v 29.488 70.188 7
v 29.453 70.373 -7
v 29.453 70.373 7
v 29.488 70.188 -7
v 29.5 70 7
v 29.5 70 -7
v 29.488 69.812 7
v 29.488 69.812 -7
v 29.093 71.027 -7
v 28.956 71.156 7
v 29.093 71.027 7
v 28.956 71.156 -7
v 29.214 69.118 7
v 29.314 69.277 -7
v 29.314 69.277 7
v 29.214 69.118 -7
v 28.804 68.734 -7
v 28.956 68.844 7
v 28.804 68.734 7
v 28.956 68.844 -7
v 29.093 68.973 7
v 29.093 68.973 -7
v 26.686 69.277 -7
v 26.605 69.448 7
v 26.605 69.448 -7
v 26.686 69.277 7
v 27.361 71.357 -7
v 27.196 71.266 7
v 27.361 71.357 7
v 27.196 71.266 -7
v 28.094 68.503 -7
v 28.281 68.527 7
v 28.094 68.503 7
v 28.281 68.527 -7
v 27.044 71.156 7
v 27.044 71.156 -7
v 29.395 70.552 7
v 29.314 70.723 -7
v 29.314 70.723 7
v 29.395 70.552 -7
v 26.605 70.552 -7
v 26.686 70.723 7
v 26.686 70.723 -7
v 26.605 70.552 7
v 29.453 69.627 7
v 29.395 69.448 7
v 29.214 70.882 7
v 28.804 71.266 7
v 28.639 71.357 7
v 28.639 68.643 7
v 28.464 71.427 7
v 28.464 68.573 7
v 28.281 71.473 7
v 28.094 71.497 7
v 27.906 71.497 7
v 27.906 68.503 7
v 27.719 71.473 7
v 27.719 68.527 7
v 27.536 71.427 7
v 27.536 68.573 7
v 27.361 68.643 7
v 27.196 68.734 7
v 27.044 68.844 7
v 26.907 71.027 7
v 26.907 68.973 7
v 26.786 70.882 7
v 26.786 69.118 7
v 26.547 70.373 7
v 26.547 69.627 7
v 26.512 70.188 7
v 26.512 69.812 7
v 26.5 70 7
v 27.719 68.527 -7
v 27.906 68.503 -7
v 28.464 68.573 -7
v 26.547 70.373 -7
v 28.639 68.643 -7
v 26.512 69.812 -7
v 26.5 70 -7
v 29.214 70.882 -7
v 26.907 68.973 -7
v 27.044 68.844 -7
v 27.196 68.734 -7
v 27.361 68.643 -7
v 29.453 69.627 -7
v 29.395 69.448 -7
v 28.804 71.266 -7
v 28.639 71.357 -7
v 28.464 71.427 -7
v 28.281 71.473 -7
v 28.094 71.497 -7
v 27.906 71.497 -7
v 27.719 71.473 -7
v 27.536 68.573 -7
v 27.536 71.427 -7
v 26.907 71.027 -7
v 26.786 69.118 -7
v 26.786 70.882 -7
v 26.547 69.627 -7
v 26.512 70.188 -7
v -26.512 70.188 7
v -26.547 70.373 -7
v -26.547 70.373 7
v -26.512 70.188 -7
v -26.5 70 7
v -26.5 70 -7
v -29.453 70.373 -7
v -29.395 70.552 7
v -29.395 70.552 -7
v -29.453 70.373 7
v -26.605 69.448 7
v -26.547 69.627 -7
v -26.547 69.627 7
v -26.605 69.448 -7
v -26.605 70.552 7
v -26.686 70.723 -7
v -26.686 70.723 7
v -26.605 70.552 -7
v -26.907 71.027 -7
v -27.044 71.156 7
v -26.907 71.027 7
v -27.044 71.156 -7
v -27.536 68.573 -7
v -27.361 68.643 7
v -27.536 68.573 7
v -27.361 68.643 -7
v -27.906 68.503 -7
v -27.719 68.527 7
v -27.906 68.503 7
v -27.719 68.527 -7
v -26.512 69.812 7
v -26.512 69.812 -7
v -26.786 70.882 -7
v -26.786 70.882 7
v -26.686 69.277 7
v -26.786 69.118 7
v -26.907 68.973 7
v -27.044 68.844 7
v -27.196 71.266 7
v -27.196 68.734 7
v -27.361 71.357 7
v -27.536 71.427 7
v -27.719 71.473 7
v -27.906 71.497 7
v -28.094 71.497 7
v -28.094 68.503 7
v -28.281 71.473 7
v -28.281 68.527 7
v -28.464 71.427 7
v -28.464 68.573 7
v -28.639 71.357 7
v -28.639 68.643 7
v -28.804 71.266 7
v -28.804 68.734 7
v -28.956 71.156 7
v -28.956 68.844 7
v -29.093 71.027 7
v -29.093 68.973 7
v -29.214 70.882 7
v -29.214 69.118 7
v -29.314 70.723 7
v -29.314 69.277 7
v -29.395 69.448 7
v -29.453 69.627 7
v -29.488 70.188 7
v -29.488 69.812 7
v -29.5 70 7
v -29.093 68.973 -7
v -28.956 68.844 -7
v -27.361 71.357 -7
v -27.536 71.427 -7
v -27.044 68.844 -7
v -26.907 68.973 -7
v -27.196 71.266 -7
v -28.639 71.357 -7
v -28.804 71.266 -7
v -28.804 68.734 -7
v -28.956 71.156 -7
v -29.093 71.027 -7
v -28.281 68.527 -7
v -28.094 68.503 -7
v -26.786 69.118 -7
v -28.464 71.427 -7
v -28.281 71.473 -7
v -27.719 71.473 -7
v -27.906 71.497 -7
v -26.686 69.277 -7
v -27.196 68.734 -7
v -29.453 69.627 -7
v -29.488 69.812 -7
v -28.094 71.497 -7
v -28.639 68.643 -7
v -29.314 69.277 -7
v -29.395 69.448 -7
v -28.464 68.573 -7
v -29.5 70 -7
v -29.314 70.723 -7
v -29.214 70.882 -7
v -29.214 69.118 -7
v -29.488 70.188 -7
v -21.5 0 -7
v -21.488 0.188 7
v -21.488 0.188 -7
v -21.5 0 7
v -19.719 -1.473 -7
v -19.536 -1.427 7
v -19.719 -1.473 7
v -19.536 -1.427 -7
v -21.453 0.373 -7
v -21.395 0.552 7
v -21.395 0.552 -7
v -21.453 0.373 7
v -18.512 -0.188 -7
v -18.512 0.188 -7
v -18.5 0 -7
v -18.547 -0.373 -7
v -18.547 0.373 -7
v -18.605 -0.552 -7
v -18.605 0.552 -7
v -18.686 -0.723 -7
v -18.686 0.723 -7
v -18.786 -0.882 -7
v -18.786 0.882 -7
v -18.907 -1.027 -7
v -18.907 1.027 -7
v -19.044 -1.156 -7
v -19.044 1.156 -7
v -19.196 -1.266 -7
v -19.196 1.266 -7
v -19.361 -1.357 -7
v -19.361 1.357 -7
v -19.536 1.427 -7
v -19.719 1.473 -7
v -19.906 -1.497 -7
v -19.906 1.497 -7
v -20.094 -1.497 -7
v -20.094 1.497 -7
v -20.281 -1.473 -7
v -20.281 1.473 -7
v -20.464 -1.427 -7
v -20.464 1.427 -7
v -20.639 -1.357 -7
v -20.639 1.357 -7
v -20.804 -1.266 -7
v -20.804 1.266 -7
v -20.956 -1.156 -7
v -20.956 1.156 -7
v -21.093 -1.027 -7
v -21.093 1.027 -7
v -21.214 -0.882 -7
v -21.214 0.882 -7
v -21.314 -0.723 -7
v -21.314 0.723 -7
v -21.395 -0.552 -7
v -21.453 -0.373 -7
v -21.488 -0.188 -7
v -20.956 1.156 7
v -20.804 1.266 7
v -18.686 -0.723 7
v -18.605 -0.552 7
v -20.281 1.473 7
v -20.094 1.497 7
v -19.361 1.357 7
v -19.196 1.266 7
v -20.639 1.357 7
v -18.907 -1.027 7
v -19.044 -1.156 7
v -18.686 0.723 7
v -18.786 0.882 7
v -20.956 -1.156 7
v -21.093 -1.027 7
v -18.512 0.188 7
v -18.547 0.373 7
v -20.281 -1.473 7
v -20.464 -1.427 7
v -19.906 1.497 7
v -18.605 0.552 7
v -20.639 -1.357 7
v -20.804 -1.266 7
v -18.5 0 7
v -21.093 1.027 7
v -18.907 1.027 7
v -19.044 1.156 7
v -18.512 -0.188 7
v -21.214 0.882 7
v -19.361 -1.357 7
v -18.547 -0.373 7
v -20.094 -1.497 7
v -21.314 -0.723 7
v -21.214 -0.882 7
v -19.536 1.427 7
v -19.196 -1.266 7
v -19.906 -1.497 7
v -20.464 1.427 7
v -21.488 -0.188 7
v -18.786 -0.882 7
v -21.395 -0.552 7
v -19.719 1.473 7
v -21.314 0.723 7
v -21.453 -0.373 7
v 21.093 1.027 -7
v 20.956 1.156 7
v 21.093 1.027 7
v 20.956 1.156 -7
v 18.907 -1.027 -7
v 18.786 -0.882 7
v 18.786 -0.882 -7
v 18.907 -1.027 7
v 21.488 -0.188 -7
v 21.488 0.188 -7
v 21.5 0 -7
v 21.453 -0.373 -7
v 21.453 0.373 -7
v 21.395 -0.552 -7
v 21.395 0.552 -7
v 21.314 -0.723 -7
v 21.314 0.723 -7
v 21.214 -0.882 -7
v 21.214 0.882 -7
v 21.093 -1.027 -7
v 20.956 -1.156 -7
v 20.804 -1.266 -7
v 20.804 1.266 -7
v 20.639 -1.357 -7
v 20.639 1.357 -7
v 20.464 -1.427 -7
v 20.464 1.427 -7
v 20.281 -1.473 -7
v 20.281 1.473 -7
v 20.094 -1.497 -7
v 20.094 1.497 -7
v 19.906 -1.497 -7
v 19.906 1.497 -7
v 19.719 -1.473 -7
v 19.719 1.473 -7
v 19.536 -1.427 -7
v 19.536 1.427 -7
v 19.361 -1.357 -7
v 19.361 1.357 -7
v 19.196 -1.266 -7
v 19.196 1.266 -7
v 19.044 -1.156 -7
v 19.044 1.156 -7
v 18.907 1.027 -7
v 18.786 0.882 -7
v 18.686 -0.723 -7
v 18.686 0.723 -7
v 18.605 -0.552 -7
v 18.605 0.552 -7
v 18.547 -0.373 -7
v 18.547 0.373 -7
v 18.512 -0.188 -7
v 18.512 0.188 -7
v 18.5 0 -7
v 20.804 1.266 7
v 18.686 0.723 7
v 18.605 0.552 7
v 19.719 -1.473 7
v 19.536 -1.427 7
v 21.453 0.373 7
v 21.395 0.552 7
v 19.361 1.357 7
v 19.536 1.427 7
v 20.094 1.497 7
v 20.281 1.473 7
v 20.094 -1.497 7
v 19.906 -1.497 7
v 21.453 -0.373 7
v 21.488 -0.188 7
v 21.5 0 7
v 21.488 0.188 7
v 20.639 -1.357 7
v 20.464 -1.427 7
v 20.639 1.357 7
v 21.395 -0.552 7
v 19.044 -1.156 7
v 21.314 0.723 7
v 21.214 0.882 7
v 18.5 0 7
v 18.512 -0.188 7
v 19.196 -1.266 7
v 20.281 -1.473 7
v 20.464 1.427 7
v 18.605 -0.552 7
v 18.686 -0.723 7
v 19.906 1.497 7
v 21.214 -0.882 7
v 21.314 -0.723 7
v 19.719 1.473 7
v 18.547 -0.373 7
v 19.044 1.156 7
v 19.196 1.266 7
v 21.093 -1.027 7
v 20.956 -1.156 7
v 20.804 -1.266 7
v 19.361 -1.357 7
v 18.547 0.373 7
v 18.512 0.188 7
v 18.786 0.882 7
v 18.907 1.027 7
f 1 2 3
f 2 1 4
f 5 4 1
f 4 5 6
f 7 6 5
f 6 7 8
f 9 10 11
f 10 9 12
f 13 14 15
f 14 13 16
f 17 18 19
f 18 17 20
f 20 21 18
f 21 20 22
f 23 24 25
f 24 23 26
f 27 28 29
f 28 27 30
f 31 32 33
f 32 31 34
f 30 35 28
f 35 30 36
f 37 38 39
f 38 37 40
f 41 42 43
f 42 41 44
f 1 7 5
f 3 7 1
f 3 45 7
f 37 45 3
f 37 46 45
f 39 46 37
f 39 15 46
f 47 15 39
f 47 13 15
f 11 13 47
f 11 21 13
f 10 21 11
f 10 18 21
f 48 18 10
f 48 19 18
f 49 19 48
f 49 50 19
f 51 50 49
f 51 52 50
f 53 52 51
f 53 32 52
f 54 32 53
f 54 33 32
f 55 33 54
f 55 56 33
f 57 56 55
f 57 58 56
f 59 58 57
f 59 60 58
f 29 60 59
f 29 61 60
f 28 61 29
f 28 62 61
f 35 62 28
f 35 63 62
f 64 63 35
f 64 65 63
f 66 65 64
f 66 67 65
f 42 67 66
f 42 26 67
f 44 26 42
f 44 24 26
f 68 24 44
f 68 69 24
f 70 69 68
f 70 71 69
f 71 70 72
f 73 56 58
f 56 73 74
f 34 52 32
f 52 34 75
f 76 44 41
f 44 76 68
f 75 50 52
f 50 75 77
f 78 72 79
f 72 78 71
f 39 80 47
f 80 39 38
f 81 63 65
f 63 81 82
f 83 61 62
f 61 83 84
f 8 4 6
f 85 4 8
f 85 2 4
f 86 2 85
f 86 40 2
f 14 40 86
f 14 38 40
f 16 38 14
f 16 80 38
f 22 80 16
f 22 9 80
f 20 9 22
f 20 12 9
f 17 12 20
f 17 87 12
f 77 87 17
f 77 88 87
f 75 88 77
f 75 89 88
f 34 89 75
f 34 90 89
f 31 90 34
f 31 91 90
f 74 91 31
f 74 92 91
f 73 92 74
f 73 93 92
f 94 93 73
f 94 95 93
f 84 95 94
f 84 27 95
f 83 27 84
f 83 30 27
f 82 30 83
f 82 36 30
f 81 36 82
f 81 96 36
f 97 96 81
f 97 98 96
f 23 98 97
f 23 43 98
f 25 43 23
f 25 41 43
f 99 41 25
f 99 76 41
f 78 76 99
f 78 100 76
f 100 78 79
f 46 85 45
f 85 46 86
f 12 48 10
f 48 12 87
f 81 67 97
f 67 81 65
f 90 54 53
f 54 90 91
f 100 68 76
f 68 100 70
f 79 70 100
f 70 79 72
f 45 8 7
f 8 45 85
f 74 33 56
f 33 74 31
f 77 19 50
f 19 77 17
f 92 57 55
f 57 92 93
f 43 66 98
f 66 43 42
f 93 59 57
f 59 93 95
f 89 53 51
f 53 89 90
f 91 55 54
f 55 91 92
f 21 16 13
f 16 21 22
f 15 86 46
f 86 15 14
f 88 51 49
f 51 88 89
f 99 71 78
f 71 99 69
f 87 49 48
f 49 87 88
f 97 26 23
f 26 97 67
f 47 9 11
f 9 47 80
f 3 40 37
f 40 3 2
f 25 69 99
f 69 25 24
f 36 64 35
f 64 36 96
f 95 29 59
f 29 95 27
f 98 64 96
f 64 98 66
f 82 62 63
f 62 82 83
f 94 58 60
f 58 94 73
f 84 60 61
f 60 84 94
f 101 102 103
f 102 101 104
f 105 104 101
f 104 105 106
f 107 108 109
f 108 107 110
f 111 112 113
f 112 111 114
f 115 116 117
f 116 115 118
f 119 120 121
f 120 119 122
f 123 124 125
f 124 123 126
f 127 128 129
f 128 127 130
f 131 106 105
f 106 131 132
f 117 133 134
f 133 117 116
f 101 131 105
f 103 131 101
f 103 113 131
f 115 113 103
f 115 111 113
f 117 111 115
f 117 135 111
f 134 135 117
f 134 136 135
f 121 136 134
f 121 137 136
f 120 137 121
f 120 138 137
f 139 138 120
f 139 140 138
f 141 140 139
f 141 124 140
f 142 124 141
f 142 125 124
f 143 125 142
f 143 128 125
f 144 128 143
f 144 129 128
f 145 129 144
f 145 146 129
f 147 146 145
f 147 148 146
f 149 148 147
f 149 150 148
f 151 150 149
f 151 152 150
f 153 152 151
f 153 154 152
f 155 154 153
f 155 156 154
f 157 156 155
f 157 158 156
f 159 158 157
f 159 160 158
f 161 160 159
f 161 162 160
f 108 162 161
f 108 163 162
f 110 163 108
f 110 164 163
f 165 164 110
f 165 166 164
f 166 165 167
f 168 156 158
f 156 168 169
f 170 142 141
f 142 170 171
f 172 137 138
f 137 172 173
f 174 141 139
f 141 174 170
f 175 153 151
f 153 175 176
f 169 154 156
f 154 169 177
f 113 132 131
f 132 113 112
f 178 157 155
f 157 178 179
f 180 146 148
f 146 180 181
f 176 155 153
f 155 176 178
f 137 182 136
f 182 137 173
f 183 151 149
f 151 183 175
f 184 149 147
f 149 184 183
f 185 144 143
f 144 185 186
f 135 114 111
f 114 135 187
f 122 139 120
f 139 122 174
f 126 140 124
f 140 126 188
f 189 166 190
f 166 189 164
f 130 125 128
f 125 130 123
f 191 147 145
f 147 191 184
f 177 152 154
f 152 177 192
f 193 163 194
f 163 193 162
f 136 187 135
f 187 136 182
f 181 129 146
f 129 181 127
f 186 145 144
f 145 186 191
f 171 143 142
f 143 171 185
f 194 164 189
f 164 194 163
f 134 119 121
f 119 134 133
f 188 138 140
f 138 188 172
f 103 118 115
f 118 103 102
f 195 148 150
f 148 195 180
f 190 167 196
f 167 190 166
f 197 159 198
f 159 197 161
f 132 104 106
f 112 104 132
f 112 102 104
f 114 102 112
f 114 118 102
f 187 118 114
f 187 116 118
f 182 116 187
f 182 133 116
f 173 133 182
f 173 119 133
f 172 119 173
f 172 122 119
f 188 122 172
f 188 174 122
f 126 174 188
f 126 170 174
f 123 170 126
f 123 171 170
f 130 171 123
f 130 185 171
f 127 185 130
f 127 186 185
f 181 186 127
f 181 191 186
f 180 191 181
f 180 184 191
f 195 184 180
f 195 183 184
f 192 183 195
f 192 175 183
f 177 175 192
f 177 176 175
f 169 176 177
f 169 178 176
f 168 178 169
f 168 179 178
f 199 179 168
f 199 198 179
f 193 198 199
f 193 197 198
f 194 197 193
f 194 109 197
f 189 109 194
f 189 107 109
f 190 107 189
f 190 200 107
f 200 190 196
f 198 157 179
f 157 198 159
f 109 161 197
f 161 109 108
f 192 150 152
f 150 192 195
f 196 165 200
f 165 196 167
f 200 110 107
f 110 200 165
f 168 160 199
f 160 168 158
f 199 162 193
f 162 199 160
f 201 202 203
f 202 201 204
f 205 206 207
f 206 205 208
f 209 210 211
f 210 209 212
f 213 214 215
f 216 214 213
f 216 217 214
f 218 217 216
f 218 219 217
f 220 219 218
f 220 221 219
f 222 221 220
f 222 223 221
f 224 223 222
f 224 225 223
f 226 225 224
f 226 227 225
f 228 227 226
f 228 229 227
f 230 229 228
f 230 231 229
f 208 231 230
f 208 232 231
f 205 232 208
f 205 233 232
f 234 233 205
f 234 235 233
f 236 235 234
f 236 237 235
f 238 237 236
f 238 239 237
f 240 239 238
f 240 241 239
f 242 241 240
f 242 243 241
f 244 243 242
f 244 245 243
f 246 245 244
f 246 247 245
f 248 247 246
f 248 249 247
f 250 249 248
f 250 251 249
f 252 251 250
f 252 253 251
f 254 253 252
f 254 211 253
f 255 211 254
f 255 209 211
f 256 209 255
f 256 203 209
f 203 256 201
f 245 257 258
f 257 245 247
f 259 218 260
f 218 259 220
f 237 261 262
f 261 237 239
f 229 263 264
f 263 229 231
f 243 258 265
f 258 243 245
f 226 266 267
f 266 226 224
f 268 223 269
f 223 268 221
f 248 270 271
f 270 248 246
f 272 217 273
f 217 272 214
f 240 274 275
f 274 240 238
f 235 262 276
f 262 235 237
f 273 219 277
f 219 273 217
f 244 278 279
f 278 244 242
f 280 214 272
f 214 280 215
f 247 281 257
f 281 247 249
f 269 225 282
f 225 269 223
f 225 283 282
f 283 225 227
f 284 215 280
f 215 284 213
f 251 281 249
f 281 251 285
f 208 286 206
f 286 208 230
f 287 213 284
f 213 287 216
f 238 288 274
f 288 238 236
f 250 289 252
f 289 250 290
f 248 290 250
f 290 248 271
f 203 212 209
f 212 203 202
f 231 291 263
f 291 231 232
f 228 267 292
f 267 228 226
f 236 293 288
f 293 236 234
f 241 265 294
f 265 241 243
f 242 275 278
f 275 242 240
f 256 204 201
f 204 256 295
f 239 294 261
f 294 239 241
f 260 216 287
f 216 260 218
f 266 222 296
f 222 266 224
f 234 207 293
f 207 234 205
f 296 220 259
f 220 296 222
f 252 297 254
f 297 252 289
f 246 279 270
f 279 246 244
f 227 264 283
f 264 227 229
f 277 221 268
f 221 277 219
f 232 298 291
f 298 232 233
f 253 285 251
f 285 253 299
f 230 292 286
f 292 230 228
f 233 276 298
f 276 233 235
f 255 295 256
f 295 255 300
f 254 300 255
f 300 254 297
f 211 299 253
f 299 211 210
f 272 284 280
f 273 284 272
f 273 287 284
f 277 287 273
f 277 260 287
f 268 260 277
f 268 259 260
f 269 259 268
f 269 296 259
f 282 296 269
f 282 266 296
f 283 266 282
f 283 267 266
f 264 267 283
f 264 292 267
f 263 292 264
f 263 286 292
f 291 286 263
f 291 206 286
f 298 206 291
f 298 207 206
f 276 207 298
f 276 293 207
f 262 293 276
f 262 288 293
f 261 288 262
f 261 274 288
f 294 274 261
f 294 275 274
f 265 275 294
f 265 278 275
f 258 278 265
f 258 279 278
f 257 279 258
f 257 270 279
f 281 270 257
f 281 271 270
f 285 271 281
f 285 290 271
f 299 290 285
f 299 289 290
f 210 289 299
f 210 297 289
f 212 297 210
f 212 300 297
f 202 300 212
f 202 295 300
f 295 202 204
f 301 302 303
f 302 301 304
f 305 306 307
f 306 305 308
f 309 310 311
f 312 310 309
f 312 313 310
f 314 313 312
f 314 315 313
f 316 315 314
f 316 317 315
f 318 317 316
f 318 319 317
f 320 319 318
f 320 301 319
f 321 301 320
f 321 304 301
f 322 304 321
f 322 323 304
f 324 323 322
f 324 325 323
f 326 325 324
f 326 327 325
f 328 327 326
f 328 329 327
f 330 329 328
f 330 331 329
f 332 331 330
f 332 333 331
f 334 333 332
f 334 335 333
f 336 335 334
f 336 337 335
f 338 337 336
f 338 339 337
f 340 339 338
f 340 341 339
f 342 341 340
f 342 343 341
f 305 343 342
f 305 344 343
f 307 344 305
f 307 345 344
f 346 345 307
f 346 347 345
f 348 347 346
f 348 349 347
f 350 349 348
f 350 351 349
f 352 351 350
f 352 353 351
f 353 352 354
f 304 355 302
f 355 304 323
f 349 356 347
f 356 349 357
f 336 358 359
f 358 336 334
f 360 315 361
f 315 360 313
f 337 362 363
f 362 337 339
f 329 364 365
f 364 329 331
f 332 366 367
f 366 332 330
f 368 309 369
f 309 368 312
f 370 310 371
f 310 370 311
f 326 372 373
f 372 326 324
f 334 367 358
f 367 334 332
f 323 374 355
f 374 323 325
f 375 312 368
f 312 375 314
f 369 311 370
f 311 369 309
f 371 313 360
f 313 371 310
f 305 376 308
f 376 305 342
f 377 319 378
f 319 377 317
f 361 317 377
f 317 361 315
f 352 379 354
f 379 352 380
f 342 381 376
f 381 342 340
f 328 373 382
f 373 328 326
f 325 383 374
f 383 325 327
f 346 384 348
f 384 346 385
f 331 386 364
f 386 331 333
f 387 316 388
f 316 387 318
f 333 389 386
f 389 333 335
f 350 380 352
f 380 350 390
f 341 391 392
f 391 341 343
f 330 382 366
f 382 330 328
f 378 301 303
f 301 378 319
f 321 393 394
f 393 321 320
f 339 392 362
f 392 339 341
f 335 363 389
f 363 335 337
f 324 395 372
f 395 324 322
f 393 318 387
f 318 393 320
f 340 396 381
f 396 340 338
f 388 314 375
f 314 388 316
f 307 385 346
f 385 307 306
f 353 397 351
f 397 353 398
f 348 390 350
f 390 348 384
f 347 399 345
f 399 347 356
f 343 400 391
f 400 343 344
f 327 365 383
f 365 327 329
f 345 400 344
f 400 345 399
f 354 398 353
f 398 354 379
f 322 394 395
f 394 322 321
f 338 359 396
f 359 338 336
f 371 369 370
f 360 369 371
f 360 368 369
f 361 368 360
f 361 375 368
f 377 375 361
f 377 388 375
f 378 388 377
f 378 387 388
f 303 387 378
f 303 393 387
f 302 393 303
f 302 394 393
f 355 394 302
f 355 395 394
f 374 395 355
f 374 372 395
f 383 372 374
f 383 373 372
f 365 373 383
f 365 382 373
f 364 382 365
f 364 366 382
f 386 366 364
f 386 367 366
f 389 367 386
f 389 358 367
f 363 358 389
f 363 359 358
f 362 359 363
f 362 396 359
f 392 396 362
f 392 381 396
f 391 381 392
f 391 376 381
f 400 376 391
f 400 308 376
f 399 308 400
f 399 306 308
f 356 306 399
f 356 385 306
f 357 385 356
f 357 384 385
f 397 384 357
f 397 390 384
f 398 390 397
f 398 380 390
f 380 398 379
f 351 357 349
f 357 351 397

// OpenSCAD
// file: ../robot_settings.scad
main_box_x = 95; // 96
main_box_y = 102;
main_box_z = 74; // 74.5
wall_thickness = 2;

rail_gap = 2;
rail_inset = 7;

rail_thickness = 7;
rail_length = 250;
rail_width = 200;

raspberry_pi_screw_seperation_y = 57;
raspberry_pi_screw_seperation_z = 48;
raspberry_pi_peg_h = 8;

gears_module = 1;
pinion_gear_teeth = 30;
pinion_gear_width = 5;
pinion_gear_bore = 4;

gears_setback_distance = 25;
gear_post_height = 2 * pinion_gear_width + rail_thickness + 8 ;

steering_motor_mount_x = 45;
steering_motor_mount_y = 36;
steering_motor_mount_z = 18;
steering_motor_mount_setback_distance = gears_setback_distance + 16;

dc_motor_housing_minus_encoder_z = 48;
dc_motor_encoder_z = 9.33;
dc_motor_encoder_wheel_d = 13.4;
dc_motor_encoder_wheel_thickness = 5;
dc_motor_encoder_wheel_gap = 3;
dc_motor_encoder_circuit_thickness = 2;
dc_motor_cutout_d = 24.8;
dc_motor_cutout_z = 19.5;

dc_motor_screw_head_z = 2;
dc_motor_screw_head_d = 5.6;
dc_motor_screw_d = 3.2;
dc_motor_screw_offset = 8.5;

dc_motor_axle_ring_z = 3;
dc_motor_axle_ring_d = 7.2;
dc_motor_axle_cutout_d = 4.5;
dc_motor_axle_cutout_z = 10;
dc_motor_axle_notch_cutout = 0.4;
dc_motor_axle_notch_cutout_z = 6;

drv8871_x = 20.3;
drv8871_y = 24;
drv8871_z = 2;
drv8871_screw_d = 2.5;
drv8871_screw_distance = 15.64;
drv8871_solder_points_z = 2;
drv8871_solder_points_d = 1.66;
drv8871_solder_offset_y = 4.4;
drv8871_solder_inner_points_distance = 5;
drv8871_solder_outer_points_distance = 12;

drv8871mount_edge_x = 1.5;
drv8871mount_edge_wall = 3;
drv8871mount_z = 5;
drv8871mount_x = drv8871_x +  drv8871mount_edge_wall - 2* drv8871mount_edge_x;
drv8871mount_y = 19;

pdmount_x = 20;
pdmount_y = 30;
pdmount_z = 2;
pdmount_edge_x = 1.5;
pdmount_edge_wall = 3;

steering_shaft_z = gear_post_height + dc_motor_axle_ring_z + pinion_gear_width + 15;
steering_shaft_d = 7;
steering_shaft_motor_fitting_d = 9;

lidar_mount_y = 110;
lidar_mount_x = 65 + 20;
lidar_narrow_screws = 40;
lidar_wide_screws = 56;
lidar_front_to_back_screws = 70;
lidar_screw_d = 3;

ball_bearing_height = 7;
ball_bearing_outer_diameter = 22;
ball_bearing_inner_diameter = 8;

pull_bar_radius = 3.3;

rack_module = 1;
rack_length = main_box_x / 2;
rack_height = 10;
rack_width = 10;
rack_teeth = 30;
rack_bore = 3;

// tire hardware
axle_length = 30;
axle_reciever_inner_diameter = 7.75;
axle_reciever_length = 18.8;
axle_notch_length = 7;
axle_notch_cutout = 2.4;

// power distribution bar
power_bar_cutout_x = 96;
power_bar_y = 19.1;
power_bar_z = 1.5;
power_bar_screw_distance = 91.4;
power_bar_screw_d = 2.8;
power_bar_standoff_z = 5;
power_bar_standoff_d = 6.83;
// main file
include <../robot_settings.scad>

$fn=50;

module lidar_cutouts() {
  translate([-lidar_narrow_screws / 2, 0, 0])
  cylinder(h = 2 * rail_thickness, d = lidar_screw_d, center = true);
  
  translate([lidar_narrow_screws / 2, 0, 0])
  cylinder(h = 2 * rail_thickness, d = lidar_screw_d, center = true);
  
  translate([0, lidar_front_to_back_screws, 0])
  {
    translate([lidar_wide_screws / 2, 0, 0])
    cylinder(h = 2 * rail_thickness, d = lidar_screw_d, center = true);

    translate([-lidar_wide_screws / 2, 0, 0])
    cylinder(h = 2* rail_thickness, d = lidar_screw_d, center = true);
  }
}
lidar_cutouts();
